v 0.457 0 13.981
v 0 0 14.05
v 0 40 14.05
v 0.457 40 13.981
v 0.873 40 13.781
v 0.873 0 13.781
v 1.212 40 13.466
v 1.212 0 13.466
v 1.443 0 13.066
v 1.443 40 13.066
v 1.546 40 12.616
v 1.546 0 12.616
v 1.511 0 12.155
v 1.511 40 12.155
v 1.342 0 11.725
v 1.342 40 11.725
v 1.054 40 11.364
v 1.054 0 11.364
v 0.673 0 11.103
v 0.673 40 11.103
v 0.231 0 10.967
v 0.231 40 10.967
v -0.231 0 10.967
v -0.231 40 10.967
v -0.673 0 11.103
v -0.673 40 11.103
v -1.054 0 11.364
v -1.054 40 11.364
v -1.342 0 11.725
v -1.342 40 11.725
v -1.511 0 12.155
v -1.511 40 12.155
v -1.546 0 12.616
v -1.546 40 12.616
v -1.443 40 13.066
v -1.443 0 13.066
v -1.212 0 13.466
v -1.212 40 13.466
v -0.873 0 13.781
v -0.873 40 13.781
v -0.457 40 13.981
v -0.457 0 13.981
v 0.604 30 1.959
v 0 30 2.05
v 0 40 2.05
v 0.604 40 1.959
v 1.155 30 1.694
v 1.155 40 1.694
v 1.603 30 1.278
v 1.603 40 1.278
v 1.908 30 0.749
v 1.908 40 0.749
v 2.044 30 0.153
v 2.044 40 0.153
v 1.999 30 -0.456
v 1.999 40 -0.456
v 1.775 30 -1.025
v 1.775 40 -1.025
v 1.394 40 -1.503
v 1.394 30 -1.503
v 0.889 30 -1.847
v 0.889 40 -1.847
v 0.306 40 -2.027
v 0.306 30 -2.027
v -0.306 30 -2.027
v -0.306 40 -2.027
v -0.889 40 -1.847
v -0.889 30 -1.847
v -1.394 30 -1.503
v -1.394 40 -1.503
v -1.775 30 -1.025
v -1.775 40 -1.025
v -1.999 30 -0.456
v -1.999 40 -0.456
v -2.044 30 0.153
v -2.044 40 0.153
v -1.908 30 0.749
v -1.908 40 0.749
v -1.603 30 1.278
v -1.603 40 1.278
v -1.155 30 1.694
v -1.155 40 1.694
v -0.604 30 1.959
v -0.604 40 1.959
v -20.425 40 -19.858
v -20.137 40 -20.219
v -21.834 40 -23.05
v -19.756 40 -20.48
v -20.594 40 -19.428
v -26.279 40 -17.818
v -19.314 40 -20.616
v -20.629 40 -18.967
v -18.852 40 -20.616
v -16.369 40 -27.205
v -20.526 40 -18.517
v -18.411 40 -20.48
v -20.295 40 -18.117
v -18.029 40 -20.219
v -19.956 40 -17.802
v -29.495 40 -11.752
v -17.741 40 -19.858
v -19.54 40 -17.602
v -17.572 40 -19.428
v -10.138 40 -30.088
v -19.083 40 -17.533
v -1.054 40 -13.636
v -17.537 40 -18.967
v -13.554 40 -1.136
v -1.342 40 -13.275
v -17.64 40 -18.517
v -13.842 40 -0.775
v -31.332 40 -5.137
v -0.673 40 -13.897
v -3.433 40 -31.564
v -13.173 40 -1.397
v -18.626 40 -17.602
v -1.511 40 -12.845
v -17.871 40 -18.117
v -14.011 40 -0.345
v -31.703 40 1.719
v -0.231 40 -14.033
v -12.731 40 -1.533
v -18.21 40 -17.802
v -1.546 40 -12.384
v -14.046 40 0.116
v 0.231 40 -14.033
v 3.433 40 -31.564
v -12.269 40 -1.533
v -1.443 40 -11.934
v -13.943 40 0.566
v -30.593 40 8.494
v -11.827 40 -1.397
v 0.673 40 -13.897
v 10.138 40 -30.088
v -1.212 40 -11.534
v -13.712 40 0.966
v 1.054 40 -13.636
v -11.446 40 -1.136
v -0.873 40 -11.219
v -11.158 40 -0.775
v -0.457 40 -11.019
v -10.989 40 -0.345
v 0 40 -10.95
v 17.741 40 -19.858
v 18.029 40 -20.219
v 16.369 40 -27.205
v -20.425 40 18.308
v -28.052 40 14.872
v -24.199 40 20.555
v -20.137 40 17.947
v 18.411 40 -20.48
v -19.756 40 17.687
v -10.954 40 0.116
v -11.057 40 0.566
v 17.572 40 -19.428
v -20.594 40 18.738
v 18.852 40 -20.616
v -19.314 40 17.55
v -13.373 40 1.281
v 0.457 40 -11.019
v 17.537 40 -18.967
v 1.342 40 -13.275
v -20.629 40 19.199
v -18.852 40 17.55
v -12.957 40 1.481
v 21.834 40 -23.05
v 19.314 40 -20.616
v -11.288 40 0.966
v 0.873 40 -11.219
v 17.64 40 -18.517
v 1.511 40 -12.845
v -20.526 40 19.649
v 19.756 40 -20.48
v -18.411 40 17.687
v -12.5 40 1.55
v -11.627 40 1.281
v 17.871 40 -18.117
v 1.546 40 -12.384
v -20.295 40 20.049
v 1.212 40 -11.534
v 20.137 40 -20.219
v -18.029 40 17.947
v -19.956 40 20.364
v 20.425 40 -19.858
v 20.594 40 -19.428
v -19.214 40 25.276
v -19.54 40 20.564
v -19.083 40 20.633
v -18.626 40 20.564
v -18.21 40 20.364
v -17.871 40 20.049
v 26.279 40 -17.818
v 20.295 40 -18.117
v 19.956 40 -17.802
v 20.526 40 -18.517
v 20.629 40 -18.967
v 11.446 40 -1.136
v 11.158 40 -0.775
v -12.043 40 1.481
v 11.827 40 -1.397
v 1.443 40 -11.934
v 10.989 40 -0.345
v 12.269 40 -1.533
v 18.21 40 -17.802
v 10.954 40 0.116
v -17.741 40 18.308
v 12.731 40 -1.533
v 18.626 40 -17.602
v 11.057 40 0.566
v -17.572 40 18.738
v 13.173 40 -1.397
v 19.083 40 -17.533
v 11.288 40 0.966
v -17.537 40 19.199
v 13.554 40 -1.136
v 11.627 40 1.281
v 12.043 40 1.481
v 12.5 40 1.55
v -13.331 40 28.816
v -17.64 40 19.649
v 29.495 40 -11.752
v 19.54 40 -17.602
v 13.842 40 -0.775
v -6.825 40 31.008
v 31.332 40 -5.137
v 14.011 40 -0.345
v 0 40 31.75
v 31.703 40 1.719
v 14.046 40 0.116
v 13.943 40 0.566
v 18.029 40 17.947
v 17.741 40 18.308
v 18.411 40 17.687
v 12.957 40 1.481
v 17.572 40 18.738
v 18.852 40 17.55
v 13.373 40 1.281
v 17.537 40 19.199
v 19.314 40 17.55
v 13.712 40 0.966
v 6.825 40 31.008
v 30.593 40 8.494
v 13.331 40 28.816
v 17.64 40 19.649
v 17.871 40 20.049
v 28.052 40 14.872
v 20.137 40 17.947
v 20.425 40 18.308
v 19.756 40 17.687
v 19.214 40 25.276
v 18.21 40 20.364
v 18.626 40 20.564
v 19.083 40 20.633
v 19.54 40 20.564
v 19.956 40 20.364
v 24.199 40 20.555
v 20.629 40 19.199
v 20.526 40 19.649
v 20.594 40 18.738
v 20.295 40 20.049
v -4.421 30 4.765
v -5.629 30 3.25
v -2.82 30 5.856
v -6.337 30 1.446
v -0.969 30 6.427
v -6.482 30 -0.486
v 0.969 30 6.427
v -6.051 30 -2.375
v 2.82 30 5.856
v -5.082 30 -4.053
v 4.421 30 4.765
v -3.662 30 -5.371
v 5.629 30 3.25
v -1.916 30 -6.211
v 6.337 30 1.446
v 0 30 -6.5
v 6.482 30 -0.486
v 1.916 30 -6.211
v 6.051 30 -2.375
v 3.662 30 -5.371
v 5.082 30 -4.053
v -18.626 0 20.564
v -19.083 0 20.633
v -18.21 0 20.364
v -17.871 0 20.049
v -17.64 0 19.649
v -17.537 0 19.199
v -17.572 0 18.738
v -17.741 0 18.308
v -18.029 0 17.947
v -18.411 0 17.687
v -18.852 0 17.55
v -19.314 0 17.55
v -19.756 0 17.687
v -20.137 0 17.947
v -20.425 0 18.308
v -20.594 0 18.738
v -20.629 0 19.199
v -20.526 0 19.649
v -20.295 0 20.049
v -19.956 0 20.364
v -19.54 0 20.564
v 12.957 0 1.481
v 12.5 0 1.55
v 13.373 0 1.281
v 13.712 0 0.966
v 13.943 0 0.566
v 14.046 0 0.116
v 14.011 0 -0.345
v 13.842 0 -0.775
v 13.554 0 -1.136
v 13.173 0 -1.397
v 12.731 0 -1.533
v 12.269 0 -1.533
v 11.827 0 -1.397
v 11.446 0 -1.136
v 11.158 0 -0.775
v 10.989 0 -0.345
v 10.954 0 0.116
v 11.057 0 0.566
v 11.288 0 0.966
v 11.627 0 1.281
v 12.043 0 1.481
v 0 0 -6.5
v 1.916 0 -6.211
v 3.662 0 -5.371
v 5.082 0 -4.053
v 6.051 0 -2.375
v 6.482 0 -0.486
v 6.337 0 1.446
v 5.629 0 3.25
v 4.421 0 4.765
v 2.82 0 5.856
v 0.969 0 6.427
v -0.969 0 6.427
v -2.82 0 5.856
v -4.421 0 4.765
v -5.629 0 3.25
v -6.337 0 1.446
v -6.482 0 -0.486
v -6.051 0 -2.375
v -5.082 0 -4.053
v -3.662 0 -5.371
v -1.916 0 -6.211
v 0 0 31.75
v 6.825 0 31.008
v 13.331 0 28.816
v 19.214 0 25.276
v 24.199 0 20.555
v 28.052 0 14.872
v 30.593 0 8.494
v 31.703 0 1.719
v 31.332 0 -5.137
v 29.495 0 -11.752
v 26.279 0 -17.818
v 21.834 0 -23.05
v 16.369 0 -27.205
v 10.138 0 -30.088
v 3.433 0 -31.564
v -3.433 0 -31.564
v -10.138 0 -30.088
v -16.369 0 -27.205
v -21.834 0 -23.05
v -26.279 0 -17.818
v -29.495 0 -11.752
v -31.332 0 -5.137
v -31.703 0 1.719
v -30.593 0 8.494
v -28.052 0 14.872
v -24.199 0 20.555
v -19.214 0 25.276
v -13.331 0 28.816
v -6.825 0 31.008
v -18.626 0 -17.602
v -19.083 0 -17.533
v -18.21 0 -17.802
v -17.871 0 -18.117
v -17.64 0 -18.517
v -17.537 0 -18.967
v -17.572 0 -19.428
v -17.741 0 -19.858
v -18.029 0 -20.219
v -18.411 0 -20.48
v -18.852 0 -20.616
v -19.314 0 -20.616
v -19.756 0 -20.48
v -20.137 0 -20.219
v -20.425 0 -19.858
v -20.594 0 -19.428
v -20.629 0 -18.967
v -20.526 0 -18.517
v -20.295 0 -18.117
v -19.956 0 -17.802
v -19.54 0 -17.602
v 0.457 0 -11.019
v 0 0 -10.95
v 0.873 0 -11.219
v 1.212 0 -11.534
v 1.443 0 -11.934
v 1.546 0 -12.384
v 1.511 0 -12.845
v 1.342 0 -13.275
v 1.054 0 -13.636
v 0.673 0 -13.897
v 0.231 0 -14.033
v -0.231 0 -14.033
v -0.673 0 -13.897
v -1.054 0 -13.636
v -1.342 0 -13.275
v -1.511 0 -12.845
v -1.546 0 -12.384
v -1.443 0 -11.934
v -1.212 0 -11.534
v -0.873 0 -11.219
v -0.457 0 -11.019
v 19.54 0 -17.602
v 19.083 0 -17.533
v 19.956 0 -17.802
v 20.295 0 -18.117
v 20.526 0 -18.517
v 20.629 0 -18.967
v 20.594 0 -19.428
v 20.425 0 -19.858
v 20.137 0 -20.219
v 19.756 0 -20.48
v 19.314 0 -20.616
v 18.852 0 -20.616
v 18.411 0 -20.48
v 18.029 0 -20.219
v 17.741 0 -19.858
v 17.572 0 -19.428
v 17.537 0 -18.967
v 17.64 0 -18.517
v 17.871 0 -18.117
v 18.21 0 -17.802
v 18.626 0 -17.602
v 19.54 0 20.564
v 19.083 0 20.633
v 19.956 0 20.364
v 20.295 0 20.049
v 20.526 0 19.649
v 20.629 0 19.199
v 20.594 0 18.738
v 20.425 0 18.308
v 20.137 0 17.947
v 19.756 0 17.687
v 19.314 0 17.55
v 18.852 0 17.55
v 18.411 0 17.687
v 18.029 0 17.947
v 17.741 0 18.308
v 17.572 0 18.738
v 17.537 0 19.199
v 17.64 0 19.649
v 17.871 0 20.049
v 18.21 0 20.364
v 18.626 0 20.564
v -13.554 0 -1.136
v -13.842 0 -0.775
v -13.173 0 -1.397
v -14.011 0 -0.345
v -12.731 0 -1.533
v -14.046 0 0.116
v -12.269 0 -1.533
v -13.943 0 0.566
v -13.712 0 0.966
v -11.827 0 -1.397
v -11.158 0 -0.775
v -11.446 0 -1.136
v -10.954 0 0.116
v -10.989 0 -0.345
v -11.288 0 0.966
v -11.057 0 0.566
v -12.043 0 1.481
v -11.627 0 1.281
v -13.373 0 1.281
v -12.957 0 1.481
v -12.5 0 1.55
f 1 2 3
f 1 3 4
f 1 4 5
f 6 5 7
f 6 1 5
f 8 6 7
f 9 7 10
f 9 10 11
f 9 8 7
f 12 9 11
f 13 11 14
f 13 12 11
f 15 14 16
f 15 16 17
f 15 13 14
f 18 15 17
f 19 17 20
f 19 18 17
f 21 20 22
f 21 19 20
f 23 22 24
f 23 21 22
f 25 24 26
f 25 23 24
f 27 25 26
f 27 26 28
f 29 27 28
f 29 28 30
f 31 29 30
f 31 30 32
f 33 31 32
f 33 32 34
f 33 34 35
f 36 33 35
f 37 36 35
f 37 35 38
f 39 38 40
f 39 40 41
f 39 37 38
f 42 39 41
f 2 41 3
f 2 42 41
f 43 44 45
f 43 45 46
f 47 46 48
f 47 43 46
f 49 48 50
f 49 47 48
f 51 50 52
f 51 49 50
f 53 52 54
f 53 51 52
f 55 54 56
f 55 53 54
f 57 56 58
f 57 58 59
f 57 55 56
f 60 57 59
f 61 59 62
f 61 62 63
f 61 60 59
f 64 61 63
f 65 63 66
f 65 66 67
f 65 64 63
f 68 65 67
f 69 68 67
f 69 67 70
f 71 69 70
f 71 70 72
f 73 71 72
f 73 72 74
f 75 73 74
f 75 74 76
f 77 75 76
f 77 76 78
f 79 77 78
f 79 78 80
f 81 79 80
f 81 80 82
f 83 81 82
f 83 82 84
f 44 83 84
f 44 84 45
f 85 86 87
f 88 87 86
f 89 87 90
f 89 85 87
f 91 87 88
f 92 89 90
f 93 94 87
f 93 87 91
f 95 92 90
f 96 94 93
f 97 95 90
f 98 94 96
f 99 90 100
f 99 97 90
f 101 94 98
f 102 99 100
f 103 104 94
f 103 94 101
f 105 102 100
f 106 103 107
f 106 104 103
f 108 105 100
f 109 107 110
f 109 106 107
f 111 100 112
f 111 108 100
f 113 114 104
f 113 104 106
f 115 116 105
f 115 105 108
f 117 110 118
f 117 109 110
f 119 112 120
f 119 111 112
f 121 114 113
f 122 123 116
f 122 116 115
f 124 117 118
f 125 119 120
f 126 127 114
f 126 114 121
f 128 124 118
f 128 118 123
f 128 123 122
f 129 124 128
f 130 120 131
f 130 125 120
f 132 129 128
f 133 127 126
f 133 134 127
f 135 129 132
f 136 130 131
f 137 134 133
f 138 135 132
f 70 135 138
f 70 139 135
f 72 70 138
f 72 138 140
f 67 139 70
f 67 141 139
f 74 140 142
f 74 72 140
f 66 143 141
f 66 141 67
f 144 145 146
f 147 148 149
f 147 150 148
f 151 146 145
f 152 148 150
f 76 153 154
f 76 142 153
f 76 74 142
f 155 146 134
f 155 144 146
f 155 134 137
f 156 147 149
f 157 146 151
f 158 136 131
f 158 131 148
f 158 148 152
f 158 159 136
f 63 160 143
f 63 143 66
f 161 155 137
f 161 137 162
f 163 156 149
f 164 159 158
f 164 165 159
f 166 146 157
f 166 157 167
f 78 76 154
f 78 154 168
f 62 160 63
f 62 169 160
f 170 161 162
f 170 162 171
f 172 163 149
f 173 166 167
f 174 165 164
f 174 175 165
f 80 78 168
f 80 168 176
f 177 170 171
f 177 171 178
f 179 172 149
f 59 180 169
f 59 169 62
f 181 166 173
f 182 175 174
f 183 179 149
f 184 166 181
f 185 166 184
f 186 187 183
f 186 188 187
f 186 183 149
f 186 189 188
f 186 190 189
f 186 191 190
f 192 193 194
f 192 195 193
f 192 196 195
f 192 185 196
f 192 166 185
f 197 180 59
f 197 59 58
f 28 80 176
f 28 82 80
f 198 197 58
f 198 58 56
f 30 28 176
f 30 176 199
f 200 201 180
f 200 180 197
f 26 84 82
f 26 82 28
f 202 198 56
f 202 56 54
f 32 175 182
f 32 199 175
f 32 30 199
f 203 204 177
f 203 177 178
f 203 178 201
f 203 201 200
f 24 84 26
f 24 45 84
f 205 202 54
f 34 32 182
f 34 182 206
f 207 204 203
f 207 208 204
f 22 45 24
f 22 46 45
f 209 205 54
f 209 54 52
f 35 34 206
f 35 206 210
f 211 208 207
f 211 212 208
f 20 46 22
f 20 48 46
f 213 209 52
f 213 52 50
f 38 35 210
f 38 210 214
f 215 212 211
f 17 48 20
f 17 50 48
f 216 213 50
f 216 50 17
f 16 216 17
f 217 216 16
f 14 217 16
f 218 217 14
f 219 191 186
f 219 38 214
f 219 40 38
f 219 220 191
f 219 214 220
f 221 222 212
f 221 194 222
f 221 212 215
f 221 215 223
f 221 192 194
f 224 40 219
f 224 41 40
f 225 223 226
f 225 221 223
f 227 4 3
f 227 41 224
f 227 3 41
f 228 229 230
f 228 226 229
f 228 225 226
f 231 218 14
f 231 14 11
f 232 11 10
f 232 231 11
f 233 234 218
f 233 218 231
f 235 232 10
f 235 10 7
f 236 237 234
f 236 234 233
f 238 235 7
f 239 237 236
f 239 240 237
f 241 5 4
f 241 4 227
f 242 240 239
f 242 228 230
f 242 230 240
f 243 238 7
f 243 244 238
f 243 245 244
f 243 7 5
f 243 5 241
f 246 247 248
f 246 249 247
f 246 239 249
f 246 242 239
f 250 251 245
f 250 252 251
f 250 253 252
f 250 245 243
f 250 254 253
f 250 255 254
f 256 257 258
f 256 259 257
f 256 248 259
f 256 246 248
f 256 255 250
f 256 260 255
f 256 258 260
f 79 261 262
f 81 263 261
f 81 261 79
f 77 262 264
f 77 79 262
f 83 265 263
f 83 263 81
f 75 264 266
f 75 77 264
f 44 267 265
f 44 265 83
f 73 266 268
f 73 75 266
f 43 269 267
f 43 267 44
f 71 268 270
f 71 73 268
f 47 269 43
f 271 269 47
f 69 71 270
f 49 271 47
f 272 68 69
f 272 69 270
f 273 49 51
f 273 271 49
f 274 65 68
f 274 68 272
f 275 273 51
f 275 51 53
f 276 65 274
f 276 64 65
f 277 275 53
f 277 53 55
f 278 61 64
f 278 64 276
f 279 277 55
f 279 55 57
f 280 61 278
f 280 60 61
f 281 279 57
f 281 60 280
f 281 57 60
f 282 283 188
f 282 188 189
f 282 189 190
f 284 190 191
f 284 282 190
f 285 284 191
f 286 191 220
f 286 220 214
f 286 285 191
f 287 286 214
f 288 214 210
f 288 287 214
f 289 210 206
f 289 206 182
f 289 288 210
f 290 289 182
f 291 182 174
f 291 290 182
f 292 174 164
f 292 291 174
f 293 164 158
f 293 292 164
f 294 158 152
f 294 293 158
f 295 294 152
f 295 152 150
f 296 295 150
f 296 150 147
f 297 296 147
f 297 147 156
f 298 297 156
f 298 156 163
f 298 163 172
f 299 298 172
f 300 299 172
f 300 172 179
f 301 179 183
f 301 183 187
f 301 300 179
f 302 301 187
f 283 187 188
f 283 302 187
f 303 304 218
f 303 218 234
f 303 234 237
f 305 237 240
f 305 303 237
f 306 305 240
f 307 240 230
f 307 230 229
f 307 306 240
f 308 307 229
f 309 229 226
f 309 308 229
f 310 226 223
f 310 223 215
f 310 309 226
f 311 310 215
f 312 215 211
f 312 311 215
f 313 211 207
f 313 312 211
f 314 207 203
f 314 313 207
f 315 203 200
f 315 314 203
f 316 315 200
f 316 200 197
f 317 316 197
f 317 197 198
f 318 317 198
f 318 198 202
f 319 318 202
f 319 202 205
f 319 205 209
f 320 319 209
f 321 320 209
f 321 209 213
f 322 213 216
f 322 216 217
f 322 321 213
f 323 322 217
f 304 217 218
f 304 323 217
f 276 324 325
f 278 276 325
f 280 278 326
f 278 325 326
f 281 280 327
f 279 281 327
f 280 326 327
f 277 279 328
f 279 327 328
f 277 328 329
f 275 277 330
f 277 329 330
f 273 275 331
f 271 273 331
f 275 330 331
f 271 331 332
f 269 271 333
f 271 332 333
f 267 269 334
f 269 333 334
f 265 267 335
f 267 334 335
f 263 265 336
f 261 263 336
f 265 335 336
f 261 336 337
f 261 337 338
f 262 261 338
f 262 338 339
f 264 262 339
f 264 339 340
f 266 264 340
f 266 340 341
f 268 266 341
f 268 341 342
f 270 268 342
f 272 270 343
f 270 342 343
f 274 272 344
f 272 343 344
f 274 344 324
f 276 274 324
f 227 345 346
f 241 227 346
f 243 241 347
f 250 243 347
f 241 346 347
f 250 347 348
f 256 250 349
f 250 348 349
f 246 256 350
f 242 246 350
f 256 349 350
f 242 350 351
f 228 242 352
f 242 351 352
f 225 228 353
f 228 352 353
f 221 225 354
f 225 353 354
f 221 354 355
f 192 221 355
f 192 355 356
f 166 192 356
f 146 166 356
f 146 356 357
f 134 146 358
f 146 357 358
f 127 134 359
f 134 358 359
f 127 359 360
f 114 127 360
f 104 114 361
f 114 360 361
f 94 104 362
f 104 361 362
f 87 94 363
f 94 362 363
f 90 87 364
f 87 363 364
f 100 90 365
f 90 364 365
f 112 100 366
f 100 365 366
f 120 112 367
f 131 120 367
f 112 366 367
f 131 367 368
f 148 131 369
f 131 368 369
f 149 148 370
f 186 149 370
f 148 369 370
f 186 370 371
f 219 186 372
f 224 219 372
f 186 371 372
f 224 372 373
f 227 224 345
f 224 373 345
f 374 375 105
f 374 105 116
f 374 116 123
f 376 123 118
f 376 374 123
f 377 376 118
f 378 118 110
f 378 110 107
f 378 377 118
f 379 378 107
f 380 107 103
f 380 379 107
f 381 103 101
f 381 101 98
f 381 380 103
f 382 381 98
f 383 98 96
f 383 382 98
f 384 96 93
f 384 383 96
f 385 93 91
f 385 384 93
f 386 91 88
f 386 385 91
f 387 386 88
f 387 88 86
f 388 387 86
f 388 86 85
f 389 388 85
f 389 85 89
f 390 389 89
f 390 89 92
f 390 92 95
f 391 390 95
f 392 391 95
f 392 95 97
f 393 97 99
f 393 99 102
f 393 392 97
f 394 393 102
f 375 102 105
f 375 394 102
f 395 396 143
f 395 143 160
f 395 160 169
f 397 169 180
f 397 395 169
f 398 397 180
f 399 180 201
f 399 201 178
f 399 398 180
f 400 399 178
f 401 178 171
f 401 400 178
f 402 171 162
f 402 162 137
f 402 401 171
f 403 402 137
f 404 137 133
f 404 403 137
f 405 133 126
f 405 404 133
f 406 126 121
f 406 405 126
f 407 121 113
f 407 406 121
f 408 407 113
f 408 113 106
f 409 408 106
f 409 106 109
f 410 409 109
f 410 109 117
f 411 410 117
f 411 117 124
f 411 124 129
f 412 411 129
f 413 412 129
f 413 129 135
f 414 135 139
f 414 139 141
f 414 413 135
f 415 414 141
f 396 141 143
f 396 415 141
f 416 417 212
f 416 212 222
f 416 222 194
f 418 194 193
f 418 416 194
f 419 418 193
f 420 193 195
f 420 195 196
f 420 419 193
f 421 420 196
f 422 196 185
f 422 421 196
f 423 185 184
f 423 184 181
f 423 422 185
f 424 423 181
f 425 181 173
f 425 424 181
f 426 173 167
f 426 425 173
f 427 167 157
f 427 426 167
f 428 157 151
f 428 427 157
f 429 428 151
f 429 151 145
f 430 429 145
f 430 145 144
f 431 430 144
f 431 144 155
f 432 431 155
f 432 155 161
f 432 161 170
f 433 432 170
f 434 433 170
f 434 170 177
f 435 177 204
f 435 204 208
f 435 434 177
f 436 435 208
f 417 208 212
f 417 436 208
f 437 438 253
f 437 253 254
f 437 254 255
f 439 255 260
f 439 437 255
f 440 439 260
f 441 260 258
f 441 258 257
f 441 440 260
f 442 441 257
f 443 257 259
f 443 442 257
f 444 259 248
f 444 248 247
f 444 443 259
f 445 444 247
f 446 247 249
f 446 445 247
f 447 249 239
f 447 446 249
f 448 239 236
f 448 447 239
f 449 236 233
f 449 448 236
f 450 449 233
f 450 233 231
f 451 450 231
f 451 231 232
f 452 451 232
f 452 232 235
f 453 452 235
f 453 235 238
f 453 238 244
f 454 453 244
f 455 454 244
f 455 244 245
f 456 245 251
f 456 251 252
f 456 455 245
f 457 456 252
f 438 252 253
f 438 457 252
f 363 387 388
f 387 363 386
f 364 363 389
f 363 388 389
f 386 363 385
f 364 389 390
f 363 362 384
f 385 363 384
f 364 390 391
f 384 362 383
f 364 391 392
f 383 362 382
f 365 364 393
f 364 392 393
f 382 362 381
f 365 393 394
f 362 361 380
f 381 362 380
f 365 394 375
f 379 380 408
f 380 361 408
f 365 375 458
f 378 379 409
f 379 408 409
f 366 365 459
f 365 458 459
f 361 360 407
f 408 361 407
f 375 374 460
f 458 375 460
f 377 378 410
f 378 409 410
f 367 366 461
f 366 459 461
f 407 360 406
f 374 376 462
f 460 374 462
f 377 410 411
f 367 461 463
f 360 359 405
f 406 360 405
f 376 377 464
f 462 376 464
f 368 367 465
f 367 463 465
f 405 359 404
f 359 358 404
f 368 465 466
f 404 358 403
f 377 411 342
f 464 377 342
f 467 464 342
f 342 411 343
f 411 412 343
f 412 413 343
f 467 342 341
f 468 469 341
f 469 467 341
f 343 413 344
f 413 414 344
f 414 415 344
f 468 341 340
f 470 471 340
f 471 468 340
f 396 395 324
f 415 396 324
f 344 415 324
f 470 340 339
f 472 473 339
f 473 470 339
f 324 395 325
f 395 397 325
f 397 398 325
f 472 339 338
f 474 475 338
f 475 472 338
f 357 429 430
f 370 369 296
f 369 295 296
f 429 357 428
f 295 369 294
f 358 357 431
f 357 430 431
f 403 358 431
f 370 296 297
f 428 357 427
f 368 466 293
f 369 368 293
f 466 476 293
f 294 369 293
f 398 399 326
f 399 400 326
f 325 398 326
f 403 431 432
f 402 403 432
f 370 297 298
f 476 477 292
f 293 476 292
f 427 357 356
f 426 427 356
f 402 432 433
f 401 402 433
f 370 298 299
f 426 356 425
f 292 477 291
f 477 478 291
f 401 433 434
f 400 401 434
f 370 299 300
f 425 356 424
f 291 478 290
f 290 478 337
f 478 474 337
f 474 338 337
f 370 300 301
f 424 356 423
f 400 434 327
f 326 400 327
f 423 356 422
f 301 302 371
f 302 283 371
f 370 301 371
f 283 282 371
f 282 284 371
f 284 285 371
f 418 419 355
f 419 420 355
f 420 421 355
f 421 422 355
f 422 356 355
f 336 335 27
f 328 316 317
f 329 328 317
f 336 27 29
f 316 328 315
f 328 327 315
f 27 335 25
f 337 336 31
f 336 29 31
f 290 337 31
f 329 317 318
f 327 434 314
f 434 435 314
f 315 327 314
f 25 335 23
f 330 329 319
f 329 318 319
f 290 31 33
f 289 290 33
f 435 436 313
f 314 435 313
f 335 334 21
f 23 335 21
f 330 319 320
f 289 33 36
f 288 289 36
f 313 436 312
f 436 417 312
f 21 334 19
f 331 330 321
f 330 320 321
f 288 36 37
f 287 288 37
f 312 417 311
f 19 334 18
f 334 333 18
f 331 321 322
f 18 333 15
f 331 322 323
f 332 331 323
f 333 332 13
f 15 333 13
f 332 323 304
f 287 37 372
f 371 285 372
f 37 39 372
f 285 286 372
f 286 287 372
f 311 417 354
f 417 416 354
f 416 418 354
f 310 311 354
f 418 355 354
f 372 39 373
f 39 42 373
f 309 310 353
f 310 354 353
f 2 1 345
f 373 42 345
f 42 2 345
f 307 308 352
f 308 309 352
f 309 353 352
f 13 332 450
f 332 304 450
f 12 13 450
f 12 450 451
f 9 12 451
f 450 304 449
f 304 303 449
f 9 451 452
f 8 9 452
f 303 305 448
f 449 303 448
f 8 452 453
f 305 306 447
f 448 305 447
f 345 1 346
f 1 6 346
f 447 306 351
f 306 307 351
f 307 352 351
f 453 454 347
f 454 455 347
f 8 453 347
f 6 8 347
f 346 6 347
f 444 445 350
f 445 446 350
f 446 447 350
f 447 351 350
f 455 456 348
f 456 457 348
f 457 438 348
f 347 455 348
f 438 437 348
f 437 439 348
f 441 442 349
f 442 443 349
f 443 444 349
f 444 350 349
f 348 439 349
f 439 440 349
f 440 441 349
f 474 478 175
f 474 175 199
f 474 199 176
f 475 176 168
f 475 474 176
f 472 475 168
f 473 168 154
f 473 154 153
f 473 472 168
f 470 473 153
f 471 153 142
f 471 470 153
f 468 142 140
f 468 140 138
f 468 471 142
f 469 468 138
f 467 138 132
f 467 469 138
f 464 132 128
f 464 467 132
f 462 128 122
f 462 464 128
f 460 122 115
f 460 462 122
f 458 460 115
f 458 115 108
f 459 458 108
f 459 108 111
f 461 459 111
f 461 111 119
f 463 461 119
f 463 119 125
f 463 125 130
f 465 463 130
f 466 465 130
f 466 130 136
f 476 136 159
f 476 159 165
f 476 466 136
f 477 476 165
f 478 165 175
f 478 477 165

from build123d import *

# Parameters (mm, degrees)
SKETCH1_R           = 31.75
SKETCH1_R_2         = 2.05
SKETCH1_R_3         = 1.55
BOSS_EXTRUDE1_DEPTH = 40
SKETCH2_R           = 6.5
CUT_EXTRUDE1_DEPTH  = 30


with BuildPart() as part:
    # Sketch1 → Boss-Extrude1 (new body)
    with BuildSketch(Plane(origin=(0, 0, 0), x_dir=(1, 0, 0), z_dir=(0, 1, 0))):
        with Locations(Location((0, 0, 0), (0, 0, 270))):
            Circle(SKETCH1_R)
        with Locations(Location((0, 0, 0), (0, 0, 270))):
            Circle(SKETCH1_R_2, mode=Mode.SUBTRACT)
        with Locations(Location((0, 12.5, 0), (0, 0, 270))):
            Circle(SKETCH1_R_3, mode=Mode.SUBTRACT)
        with Locations(Location((12.5, 0, 0), (0, 0, 270))):
            Circle(SKETCH1_R_3, mode=Mode.SUBTRACT)
        with Locations(Location((0, -12.5, 0), (0, 0, 270))):
            Circle(SKETCH1_R_3, mode=Mode.SUBTRACT)
        with Locations(Location((-12.5, 0, 0), (0, 0, 270))):
            Circle(SKETCH1_R_3, mode=Mode.SUBTRACT)
        with Locations(Location((19.083044257, 19.083044257, 0), (0, 0, 270))):
            Circle(SKETCH1_R_3, mode=Mode.SUBTRACT)
        with Locations(Location((19.083044257, -19.083044257, 0), (0, 0, 270))):
            Circle(SKETCH1_R_3, mode=Mode.SUBTRACT)
        with Locations(Location((-19.083044257, -19.083044257, 0), (0, 0, 270))):
            Circle(SKETCH1_R_3, mode=Mode.SUBTRACT)
        with Locations(Location((-19.083044257, 19.083044257, 0), (0, 0, 270))):
            Circle(SKETCH1_R_3, mode=Mode.SUBTRACT)
    extrude(amount=BOSS_EXTRUDE1_DEPTH)

    # Sketch2 → Cut-Extrude1 (cut)
    with BuildSketch(Plane.XZ):
        with Locations(Location((0, 0, 0), (0, 0, 270))):
            Circle(SKETCH2_R)
    extrude(amount=-CUT_EXTRUDE1_DEPTH, mode=Mode.SUBTRACT)


solid = part.part
